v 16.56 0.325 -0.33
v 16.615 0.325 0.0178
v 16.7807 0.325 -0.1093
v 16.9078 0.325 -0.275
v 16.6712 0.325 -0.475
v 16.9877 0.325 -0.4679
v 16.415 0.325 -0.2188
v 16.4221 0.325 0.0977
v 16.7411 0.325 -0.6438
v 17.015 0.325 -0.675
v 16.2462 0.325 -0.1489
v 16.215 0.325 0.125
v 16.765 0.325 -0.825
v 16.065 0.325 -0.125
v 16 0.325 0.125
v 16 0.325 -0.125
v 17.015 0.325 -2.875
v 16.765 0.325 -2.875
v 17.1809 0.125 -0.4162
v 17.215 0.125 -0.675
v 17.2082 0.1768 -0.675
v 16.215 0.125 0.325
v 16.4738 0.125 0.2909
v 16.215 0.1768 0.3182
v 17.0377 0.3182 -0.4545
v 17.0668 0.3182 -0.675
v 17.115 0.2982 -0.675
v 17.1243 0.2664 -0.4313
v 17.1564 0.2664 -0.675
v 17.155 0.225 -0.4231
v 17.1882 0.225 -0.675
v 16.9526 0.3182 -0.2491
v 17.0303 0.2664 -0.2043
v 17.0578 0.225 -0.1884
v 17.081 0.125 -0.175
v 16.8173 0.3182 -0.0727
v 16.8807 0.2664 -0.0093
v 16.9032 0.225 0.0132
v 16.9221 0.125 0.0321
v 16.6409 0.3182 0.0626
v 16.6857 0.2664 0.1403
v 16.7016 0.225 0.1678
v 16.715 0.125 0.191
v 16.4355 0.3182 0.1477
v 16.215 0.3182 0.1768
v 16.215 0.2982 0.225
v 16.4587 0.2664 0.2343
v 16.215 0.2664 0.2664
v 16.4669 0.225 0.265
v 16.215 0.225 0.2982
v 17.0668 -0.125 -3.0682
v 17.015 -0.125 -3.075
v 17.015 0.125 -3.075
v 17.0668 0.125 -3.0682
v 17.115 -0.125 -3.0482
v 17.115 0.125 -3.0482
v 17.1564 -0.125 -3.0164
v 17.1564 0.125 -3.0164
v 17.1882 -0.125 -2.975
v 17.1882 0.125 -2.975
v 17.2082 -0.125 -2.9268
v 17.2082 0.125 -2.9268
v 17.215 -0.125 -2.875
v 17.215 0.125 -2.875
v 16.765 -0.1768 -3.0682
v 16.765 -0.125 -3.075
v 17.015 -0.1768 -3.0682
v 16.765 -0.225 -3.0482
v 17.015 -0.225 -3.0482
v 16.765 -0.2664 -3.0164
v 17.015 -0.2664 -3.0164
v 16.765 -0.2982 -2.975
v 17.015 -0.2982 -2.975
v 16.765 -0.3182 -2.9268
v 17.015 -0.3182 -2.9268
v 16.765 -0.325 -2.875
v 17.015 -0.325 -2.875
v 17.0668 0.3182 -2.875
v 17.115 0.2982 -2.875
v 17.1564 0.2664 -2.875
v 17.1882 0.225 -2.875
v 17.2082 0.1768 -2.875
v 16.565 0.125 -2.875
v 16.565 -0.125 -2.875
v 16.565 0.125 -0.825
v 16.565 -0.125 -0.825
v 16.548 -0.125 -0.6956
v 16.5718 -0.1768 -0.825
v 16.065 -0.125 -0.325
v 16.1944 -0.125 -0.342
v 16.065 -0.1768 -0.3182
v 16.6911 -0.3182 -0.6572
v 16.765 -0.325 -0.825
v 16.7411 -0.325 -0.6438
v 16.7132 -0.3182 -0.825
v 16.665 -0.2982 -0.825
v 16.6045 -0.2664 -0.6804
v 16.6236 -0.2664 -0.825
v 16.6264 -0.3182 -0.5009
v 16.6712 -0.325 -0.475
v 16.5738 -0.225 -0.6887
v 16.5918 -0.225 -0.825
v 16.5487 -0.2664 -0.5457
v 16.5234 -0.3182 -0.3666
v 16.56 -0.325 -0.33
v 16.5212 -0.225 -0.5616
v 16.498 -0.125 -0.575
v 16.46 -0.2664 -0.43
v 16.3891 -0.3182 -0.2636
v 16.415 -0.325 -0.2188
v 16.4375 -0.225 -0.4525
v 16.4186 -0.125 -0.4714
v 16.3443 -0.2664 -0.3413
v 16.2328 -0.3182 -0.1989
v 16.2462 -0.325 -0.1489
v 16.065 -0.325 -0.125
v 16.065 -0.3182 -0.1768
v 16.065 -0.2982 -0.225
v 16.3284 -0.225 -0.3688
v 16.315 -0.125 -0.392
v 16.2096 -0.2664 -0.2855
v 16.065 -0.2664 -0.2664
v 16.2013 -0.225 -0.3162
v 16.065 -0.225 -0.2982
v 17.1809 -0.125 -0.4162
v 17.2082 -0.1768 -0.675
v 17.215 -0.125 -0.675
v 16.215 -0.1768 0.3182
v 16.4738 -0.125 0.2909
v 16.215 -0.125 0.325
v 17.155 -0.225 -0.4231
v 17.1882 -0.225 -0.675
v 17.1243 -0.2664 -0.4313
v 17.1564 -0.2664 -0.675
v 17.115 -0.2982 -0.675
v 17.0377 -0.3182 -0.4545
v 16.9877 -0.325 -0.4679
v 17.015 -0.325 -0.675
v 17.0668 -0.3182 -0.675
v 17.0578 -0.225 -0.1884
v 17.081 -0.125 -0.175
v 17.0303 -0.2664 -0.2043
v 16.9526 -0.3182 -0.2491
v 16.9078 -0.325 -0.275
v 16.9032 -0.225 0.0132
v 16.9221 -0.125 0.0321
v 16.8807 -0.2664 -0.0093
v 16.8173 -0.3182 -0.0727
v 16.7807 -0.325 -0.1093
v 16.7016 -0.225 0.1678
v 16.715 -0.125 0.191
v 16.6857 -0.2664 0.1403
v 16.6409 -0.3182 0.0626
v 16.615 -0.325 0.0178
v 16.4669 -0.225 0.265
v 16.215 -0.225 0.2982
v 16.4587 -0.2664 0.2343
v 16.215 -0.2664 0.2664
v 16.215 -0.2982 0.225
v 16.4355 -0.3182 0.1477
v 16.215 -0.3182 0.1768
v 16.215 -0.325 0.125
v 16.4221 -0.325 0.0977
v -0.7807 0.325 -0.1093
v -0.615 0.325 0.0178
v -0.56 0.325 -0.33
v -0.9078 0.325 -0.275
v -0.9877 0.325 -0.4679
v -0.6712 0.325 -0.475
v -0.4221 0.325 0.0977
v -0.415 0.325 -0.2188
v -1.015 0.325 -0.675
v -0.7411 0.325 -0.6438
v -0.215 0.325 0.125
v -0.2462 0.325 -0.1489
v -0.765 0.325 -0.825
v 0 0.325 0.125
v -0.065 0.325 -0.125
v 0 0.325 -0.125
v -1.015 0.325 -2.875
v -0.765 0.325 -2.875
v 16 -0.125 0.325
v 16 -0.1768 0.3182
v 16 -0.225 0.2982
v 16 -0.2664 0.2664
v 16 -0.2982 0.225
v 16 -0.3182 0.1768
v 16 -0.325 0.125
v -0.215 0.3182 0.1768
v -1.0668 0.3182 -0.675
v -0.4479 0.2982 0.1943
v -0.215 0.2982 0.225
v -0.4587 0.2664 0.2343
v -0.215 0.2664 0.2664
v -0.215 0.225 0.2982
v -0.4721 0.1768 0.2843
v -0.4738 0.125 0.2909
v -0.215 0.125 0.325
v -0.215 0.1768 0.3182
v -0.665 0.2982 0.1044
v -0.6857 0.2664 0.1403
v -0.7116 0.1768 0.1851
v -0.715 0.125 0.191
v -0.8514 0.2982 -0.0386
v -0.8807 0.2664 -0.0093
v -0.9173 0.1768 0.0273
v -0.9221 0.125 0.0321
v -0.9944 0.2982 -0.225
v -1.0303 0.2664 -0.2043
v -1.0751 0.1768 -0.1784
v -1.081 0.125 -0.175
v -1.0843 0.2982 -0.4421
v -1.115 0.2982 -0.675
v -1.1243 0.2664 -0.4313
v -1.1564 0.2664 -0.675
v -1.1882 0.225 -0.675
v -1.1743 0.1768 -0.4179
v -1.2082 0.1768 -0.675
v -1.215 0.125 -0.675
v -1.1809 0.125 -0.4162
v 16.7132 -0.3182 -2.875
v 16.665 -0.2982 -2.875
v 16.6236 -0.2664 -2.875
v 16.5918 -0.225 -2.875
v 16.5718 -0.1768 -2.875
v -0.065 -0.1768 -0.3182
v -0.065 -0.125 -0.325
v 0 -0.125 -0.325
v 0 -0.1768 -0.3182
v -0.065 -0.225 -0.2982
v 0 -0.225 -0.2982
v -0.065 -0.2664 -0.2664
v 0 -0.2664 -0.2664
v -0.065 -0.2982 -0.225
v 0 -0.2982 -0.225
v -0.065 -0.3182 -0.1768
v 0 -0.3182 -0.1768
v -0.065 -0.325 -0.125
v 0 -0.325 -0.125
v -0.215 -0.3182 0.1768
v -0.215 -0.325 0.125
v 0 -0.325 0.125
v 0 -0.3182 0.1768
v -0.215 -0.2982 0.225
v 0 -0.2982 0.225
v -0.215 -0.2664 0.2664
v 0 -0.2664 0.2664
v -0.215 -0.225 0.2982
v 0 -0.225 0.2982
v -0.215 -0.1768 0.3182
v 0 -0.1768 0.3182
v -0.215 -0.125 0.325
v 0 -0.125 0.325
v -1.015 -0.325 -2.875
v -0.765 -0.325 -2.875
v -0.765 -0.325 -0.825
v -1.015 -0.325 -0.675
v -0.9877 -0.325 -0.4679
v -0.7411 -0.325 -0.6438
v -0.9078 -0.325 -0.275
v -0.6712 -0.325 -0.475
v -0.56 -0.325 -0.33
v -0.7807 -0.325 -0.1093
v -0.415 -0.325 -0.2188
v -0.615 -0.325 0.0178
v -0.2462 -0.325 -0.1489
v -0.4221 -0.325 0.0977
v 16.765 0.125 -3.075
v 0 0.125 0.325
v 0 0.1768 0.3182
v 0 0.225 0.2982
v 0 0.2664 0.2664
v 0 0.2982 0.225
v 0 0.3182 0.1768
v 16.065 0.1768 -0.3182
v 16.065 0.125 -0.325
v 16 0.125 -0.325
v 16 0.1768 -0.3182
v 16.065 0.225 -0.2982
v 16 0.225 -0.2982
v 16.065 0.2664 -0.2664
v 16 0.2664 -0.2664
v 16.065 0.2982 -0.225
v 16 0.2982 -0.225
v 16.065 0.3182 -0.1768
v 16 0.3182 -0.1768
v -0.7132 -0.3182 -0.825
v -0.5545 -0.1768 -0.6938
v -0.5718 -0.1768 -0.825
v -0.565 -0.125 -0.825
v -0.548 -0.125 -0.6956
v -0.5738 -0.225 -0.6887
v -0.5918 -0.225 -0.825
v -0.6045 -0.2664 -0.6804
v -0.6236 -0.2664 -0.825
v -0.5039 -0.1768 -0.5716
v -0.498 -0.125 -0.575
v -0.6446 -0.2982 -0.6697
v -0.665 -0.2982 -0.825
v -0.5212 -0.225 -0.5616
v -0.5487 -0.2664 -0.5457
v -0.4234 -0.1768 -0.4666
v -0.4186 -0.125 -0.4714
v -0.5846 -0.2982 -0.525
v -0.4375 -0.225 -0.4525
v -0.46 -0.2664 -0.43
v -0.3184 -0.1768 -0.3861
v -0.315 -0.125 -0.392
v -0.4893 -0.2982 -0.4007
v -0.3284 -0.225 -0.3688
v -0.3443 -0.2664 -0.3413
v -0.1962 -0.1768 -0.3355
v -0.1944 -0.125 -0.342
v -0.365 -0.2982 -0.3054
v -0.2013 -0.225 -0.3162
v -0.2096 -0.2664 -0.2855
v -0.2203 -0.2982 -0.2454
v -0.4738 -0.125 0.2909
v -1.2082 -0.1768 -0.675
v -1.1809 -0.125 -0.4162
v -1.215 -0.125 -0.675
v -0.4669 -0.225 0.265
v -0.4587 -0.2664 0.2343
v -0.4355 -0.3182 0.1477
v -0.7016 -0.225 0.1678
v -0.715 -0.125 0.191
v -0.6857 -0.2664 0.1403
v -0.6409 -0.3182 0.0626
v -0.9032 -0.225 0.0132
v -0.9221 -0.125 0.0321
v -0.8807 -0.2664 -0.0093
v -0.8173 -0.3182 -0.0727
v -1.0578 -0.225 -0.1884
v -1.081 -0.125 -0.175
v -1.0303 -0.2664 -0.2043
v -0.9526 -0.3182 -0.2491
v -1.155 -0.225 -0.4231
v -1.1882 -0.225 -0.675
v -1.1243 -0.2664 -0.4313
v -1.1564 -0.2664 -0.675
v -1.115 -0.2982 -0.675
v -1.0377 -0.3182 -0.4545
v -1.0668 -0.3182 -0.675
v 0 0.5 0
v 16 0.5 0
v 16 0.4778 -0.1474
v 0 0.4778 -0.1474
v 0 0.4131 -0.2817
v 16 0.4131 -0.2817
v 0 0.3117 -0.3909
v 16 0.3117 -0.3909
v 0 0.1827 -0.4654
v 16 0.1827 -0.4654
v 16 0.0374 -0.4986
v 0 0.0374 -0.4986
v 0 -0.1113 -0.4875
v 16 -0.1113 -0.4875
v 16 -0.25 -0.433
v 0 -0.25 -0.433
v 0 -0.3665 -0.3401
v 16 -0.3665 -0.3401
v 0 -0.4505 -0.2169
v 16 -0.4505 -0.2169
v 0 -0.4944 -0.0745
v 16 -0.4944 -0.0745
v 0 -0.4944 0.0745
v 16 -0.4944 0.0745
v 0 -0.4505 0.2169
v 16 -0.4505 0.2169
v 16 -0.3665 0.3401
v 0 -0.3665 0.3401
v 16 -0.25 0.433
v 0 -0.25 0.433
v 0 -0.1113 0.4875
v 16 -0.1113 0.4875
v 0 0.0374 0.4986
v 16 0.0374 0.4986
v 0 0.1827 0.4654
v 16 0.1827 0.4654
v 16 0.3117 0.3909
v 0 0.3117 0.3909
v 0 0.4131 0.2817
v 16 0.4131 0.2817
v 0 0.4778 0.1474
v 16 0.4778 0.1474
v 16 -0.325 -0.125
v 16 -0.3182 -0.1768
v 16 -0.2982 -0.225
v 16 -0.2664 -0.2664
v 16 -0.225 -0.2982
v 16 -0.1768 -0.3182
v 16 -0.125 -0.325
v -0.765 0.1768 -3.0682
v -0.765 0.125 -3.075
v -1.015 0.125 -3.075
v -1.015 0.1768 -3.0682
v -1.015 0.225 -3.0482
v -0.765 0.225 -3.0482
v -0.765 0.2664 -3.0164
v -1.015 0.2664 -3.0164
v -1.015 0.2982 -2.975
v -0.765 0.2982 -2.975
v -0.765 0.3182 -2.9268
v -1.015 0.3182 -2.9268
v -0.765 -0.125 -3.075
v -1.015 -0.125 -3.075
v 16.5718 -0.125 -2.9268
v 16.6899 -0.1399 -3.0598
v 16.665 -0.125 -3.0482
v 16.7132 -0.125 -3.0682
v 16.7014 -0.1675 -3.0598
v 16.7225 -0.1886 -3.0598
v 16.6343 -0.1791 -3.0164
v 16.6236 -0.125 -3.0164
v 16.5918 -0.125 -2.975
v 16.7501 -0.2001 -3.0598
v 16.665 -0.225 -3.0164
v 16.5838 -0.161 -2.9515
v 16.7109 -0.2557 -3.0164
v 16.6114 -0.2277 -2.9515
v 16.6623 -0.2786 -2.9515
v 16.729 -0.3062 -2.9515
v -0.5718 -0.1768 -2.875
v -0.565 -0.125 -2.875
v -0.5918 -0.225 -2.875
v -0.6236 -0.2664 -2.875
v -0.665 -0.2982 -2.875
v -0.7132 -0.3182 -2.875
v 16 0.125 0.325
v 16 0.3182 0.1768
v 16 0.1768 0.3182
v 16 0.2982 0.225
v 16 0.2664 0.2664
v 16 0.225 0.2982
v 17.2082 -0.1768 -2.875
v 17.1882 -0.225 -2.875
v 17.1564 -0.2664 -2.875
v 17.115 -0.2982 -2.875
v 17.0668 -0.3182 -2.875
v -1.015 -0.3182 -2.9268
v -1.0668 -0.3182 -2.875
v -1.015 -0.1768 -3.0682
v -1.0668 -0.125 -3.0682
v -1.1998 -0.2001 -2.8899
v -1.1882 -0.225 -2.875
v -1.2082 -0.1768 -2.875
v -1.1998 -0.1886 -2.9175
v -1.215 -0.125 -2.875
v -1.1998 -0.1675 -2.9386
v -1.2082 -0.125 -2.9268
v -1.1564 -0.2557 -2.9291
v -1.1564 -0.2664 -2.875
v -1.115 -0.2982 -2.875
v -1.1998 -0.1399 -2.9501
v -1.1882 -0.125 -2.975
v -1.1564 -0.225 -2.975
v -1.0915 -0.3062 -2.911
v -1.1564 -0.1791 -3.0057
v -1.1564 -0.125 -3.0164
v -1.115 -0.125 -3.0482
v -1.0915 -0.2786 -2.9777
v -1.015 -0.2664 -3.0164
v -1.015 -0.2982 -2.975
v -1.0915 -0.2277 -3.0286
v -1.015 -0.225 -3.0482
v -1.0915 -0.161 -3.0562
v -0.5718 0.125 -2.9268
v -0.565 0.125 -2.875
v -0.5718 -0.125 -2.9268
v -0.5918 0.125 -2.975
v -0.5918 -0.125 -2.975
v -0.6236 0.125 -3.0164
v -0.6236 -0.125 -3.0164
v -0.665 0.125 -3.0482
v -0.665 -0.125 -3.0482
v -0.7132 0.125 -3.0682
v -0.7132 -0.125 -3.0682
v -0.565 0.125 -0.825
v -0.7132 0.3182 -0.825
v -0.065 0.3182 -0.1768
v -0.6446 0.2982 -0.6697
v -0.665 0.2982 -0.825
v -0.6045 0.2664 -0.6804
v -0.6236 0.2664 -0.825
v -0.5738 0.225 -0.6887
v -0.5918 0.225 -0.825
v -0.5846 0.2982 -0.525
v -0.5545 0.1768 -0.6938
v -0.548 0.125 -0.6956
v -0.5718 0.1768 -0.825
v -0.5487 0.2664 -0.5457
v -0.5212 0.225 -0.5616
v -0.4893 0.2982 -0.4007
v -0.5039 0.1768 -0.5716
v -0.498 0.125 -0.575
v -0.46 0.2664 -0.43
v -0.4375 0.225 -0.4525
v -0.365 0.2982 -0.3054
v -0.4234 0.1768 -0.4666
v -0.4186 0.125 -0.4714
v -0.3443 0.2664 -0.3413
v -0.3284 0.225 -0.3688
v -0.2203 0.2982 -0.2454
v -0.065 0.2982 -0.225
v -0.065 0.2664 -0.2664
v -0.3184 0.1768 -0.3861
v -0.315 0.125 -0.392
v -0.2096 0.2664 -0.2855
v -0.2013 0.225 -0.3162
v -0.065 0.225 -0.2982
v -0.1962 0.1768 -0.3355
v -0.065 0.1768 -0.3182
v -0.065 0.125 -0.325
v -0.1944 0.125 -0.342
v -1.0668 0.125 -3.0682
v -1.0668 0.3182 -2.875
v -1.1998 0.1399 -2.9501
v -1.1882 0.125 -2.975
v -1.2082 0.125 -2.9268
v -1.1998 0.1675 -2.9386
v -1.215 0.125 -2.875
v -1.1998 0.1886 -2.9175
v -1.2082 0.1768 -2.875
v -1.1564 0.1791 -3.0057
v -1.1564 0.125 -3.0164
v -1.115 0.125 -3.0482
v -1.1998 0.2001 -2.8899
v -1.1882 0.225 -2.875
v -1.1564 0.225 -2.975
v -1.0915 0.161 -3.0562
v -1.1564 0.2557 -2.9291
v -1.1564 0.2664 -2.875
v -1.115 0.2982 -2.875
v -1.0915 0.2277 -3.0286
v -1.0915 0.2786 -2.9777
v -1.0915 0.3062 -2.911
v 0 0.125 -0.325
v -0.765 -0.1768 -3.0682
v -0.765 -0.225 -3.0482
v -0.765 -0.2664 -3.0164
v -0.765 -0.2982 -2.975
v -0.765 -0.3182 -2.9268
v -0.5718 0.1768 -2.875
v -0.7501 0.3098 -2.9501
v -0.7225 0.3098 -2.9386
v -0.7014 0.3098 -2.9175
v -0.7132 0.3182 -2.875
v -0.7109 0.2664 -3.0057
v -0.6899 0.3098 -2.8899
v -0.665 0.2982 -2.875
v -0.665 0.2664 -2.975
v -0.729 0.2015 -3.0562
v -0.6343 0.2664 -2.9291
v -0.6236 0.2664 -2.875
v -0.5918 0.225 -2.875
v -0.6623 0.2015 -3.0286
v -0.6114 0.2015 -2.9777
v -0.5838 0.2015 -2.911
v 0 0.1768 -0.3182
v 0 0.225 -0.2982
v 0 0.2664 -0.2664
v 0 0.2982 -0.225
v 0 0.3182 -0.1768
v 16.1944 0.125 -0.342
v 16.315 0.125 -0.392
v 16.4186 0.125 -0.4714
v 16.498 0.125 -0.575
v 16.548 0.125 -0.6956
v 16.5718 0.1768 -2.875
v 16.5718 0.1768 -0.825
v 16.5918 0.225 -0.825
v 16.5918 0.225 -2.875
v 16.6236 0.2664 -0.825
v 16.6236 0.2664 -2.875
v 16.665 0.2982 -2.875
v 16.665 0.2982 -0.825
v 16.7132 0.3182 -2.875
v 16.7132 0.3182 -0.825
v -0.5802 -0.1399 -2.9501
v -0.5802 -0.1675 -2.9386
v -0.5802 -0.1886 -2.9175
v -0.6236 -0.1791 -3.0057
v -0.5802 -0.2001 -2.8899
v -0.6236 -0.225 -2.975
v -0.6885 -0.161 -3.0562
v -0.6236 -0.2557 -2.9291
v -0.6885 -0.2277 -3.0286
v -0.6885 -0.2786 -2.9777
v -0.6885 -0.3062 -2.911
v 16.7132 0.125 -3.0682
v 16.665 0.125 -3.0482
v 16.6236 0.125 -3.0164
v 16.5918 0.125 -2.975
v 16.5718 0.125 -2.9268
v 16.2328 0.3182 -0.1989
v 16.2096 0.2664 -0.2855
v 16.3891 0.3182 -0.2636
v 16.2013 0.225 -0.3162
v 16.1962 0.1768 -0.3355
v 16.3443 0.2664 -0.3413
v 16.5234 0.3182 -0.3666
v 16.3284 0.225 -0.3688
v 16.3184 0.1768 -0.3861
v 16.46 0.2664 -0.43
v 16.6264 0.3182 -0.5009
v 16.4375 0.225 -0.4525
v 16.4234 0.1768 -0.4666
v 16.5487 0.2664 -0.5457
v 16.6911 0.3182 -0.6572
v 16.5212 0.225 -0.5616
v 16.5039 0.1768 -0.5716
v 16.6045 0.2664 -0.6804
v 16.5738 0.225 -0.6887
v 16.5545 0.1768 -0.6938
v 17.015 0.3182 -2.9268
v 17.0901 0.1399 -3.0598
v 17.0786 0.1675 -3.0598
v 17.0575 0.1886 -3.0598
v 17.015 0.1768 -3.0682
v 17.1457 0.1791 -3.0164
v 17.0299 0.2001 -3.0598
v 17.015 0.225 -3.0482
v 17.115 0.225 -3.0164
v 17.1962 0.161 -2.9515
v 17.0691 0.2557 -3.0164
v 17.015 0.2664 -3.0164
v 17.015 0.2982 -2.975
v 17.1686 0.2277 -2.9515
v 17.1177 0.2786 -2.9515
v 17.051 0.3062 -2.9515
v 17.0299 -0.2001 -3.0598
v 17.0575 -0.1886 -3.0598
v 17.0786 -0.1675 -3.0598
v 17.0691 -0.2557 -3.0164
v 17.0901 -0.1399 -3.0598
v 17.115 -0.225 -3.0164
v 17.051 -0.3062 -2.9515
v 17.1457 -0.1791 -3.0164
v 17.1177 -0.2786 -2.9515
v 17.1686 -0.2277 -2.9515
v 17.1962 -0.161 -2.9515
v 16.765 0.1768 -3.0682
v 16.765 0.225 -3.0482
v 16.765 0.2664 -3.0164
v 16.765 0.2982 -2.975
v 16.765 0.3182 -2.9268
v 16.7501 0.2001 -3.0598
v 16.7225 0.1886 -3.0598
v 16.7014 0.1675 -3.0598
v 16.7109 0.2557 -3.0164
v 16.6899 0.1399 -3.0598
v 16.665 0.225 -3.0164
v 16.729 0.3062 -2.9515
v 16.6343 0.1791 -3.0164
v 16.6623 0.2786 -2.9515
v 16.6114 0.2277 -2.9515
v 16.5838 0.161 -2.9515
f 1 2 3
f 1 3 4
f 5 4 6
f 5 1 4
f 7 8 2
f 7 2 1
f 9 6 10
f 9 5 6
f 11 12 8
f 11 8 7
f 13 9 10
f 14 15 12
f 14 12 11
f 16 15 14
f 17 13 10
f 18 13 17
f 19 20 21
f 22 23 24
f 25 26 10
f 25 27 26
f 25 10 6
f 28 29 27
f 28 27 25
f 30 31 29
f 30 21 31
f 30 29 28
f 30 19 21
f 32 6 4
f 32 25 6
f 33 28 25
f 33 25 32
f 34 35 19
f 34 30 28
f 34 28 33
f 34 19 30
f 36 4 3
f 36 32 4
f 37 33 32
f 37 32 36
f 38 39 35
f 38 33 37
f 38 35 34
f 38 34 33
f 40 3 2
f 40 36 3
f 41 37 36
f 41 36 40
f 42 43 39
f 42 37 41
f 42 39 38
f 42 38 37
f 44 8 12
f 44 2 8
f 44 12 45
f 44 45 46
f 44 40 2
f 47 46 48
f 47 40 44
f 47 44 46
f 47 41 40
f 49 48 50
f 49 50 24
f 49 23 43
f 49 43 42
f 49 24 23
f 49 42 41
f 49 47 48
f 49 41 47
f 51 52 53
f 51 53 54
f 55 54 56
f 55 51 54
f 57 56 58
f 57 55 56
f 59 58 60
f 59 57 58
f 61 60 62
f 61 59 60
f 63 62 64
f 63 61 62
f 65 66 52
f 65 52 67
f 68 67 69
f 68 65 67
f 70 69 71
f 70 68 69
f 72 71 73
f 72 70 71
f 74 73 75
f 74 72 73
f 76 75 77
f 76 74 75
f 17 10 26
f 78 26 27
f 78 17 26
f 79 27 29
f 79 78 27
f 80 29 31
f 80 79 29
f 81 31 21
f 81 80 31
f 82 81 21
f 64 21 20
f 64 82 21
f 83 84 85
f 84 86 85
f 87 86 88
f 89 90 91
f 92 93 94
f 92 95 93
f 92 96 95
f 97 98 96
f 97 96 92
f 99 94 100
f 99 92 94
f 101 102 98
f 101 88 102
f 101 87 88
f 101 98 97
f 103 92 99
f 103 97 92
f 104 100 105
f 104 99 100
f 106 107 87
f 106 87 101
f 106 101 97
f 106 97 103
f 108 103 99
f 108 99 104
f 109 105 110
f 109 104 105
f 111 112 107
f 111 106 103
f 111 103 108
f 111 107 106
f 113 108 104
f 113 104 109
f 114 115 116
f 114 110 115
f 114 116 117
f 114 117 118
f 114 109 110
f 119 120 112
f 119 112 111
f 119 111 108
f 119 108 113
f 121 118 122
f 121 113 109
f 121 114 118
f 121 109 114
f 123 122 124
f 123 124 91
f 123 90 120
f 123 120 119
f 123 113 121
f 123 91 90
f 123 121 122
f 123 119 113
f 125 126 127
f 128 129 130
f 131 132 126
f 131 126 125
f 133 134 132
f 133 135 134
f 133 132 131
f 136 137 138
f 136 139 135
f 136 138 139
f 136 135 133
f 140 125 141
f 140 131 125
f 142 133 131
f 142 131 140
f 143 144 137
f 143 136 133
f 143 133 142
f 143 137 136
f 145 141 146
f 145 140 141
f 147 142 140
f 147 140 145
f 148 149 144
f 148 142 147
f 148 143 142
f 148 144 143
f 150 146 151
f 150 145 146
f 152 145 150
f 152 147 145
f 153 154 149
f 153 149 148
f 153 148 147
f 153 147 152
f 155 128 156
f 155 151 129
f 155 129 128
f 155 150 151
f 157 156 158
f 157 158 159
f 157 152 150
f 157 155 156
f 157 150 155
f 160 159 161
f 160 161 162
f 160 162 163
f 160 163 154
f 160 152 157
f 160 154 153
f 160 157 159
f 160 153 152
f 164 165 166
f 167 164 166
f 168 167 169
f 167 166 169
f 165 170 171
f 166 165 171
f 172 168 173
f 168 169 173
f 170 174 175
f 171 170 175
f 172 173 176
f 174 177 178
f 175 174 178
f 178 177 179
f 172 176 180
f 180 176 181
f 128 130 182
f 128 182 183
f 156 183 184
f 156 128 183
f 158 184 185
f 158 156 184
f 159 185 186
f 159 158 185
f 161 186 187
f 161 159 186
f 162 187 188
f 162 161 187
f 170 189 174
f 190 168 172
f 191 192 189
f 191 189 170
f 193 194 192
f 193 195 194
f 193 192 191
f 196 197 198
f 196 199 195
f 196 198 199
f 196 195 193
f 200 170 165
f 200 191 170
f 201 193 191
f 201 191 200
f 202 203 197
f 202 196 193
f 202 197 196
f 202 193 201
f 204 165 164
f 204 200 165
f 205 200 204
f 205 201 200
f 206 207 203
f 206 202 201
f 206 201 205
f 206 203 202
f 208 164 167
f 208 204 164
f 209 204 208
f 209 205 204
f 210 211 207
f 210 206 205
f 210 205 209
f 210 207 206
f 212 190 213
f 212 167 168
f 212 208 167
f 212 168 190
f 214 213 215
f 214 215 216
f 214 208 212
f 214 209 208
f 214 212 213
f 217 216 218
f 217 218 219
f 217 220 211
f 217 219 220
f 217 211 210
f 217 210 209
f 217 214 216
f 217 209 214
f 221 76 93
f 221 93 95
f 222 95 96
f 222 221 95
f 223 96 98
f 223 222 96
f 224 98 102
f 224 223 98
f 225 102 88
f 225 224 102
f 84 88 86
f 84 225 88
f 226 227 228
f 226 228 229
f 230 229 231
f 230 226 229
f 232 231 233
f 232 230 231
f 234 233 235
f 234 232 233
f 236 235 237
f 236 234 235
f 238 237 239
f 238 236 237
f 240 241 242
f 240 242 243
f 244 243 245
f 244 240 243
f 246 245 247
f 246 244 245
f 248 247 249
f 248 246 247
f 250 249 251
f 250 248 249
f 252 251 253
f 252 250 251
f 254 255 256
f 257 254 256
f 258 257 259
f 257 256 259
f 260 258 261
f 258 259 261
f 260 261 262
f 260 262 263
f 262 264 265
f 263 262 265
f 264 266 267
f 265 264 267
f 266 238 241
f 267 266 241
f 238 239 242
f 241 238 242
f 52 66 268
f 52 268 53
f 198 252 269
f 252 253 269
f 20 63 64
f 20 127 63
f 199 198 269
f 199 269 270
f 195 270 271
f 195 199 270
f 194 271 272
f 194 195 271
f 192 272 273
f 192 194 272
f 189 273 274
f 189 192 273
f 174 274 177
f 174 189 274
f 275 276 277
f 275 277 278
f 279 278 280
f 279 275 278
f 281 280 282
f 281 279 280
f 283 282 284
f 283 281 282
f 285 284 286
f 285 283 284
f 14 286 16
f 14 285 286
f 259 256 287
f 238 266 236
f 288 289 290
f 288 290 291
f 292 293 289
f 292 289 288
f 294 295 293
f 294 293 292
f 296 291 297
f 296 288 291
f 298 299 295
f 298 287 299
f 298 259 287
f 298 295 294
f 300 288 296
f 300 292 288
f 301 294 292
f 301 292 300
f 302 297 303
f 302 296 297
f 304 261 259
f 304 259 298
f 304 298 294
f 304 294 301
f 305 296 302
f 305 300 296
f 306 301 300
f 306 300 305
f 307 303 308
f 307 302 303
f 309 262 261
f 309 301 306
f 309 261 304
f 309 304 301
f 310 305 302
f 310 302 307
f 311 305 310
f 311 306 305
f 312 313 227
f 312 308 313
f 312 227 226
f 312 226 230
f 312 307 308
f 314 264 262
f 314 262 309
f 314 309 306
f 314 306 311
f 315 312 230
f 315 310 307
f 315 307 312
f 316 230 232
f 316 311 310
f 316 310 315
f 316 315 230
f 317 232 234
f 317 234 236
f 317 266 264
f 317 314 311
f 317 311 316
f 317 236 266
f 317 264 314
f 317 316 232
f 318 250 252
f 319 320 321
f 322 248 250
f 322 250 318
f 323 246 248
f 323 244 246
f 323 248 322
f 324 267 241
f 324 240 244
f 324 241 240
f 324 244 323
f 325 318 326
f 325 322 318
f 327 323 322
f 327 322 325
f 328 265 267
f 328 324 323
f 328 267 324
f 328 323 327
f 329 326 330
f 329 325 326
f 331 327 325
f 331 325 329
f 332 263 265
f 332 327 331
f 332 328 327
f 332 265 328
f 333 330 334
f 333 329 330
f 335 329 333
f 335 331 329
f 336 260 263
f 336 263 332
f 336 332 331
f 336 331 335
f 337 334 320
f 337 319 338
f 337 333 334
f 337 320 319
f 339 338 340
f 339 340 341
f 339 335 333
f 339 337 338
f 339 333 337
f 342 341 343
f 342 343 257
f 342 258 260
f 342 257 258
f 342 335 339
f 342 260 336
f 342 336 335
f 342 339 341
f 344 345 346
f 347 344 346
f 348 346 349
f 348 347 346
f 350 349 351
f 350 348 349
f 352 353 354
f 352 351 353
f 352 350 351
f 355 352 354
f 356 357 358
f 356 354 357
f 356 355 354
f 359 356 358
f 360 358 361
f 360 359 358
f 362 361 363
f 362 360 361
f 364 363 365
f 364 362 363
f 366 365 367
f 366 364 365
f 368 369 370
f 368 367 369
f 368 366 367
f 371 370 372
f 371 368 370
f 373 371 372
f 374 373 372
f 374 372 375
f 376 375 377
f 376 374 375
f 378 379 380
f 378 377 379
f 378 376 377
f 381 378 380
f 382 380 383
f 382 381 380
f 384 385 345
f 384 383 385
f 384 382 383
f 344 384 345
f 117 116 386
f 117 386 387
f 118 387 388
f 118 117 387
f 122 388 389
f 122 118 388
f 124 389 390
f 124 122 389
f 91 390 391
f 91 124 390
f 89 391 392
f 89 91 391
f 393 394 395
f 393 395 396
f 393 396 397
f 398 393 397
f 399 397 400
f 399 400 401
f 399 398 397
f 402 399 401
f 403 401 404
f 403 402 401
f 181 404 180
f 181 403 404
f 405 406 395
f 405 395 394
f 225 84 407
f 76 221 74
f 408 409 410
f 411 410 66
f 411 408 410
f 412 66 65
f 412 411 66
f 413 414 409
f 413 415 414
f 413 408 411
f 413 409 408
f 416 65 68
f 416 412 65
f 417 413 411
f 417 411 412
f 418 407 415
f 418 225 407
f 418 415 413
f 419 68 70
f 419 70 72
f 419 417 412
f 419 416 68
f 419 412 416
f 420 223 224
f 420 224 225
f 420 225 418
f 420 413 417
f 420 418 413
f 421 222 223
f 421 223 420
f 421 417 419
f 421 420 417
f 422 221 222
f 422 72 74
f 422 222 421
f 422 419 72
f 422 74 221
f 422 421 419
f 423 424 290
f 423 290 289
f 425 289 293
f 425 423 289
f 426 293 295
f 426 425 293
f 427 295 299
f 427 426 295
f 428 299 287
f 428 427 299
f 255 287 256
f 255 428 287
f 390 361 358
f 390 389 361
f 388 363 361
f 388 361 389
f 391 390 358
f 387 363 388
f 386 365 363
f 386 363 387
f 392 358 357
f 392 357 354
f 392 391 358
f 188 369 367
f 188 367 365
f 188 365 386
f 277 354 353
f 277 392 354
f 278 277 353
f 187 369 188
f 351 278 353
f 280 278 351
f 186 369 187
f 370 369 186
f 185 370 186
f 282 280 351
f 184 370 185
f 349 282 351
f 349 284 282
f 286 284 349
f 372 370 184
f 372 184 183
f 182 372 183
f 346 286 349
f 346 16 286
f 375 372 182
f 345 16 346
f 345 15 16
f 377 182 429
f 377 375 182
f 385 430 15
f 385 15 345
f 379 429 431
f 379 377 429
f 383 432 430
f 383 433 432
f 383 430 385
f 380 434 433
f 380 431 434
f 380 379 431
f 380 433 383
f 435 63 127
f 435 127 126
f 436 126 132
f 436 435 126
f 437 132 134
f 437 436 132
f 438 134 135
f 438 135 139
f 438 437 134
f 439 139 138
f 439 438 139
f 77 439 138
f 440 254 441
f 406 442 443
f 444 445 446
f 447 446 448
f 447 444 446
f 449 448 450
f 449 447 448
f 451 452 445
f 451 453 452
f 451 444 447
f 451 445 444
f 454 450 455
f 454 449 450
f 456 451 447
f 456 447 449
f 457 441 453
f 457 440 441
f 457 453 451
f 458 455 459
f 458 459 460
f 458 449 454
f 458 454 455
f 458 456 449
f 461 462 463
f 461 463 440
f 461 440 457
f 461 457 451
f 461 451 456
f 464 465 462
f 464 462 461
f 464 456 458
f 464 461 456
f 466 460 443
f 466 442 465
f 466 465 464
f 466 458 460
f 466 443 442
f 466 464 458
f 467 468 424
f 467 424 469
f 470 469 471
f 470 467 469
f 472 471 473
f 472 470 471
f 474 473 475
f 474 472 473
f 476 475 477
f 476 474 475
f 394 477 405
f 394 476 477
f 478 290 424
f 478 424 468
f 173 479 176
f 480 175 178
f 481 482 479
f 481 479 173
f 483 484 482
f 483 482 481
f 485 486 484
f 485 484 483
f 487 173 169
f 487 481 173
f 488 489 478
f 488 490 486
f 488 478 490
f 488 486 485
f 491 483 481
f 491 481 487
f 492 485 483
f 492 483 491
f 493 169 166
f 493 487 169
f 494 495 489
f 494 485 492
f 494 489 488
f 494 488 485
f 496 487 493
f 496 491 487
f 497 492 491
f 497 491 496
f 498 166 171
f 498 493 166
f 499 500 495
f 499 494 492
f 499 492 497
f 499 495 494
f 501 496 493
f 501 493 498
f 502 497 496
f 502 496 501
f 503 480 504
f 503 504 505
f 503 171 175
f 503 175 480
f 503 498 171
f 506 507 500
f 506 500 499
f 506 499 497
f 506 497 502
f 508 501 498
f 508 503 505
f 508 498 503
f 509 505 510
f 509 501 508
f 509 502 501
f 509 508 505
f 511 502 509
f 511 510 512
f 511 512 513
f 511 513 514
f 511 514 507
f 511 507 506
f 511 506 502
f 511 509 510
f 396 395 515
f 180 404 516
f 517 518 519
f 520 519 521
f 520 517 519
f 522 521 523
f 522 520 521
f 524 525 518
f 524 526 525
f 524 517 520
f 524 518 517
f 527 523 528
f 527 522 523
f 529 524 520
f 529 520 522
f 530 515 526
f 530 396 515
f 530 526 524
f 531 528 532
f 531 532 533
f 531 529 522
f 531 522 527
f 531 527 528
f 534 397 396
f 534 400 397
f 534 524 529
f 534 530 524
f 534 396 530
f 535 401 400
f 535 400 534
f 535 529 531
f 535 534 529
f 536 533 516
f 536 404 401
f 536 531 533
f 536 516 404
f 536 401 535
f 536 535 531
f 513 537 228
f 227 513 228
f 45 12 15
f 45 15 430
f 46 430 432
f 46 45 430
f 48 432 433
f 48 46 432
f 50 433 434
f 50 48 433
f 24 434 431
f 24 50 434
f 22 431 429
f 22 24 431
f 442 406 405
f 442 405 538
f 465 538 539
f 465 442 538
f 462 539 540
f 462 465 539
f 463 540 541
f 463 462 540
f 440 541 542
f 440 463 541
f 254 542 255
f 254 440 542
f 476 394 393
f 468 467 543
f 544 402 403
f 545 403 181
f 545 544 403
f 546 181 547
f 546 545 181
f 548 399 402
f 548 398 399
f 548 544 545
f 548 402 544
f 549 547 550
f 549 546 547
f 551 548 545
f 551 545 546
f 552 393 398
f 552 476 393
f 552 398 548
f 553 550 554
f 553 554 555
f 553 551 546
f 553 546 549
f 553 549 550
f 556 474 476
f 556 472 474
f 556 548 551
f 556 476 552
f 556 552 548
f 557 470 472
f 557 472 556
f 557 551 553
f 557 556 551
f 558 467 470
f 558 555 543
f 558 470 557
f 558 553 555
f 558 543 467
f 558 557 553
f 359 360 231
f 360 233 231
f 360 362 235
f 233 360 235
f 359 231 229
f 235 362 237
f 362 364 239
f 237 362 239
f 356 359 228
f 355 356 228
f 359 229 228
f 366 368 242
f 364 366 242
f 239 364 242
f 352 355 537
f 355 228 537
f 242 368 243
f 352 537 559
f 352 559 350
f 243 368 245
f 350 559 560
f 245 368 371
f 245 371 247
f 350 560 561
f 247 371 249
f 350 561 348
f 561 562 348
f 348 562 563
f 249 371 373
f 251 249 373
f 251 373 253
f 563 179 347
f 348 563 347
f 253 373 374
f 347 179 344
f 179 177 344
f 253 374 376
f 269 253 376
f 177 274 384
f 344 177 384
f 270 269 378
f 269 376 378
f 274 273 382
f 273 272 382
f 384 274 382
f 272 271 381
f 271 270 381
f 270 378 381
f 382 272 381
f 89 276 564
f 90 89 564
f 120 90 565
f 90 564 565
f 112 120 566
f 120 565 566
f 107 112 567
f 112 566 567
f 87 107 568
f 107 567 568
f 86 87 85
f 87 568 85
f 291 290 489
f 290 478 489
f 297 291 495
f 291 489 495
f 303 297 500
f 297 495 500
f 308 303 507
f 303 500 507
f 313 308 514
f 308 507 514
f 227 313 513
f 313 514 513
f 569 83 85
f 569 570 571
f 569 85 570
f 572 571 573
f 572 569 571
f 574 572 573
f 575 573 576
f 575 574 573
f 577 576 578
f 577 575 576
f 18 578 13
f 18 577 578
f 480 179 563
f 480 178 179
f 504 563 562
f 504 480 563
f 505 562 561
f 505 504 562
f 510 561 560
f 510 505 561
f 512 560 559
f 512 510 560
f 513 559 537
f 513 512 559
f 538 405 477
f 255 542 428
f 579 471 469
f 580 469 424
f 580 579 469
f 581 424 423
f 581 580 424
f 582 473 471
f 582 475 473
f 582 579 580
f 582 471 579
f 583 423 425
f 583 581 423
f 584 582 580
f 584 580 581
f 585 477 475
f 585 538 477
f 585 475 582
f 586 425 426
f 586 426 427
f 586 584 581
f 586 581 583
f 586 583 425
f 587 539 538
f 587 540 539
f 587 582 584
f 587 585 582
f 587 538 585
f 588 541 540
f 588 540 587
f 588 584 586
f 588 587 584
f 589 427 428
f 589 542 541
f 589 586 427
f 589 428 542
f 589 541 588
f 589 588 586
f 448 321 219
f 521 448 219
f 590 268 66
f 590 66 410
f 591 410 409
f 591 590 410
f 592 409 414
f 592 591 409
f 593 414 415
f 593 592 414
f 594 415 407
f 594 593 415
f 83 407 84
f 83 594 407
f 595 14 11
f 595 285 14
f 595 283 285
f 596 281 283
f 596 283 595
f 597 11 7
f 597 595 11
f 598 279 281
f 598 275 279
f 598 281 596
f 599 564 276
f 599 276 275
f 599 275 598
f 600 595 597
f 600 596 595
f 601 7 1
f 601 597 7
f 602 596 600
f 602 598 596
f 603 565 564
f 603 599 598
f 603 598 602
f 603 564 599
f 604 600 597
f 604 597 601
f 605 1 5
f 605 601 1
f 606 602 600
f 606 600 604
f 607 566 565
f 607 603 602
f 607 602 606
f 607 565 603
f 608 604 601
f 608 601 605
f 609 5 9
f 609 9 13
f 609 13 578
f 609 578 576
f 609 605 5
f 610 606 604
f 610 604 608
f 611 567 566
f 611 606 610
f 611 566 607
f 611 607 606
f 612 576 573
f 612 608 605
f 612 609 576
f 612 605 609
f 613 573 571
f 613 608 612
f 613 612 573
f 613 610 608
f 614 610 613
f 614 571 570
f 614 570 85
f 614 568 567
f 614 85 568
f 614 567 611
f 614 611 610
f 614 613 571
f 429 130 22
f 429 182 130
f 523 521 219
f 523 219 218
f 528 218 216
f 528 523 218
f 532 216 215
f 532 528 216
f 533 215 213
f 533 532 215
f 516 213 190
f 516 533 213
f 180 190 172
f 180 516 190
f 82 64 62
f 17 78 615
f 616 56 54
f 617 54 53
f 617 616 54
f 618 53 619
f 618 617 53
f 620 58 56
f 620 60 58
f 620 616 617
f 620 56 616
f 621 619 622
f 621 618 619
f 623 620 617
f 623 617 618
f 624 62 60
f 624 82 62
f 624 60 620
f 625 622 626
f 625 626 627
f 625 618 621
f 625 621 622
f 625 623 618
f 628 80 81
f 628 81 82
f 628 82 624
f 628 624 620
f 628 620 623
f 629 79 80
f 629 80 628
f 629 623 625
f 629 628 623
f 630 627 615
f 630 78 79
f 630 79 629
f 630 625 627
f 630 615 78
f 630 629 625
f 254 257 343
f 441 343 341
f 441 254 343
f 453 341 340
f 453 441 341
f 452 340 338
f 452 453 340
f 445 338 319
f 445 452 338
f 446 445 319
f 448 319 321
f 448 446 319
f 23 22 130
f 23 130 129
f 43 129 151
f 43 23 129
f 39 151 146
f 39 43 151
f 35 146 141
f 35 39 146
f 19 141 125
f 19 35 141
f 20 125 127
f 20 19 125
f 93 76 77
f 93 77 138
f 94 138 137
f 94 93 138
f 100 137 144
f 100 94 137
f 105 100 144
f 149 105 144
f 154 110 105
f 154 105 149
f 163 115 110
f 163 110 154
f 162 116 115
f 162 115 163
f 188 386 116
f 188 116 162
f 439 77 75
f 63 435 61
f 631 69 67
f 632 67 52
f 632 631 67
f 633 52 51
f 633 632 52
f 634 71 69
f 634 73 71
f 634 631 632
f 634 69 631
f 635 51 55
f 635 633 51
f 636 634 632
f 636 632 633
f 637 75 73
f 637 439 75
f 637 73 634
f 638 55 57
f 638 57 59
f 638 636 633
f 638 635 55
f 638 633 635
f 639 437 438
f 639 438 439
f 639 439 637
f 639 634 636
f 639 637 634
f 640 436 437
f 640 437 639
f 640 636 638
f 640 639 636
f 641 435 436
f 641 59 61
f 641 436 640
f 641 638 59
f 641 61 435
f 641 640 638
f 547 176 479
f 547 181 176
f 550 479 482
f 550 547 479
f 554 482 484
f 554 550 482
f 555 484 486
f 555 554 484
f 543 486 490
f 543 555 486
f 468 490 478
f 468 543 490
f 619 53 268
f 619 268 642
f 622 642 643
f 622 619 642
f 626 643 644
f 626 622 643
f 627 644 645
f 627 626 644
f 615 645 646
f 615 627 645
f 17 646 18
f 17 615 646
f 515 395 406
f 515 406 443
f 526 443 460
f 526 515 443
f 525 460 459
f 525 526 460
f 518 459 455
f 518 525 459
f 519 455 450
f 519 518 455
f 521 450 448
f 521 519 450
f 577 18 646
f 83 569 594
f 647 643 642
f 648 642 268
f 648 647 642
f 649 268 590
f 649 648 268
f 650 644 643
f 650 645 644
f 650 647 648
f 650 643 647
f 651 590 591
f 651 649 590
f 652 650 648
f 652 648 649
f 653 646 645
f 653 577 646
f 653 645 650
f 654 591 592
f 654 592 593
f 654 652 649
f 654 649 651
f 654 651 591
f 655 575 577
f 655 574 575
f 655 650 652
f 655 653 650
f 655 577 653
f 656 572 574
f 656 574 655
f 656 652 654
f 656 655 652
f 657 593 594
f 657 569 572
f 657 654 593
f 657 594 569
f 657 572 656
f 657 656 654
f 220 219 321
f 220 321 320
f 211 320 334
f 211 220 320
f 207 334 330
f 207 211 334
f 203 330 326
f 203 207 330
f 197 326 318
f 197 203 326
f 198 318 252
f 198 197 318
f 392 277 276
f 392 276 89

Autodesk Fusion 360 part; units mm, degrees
sketch "Sketch1" plane through (0, 0, 0) normal (1, 0, 0) x (0, 1, 0)
  circle A0 centre (0, 0) radius 0.5
  line L0 (0.325, -0.325) -> (-0.325, -0.325)
  line L1 (-0.325, -0.325) -> (-0.325, 0.325)
  line L2 (-0.325, 0.325) -> (0.325, 0.325)
  line L3 (0.325, 0.325) -> (0.325, -0.325)
  line L4 (0.325, -0.325) -> (-0.325, 0.325) construction
  line L5 (-0.325, -0.325) -> (0.325, 0.325) construction
  dimension "d1" = 1
  dimension "d2" = 0.65
  dimension "d3" = 0.65
extrude "Extrude1" add sketch "Sketch1" along normal blind 16 contours A0 | L0 L1 L2 L3
sketch "Sketch2" plane through (16, 0, 0) normal (1, 0, 0) x (0, 1, 0)
  circle A0 centre (0, 0) radius 0.5
  line L0 (0.325, -0.325) -> (-0.325, -0.325)
  line L1 (-0.325, -0.325) -> (-0.325, 0.325)
  line L2 (-0.325, 0.325) -> (0.325, 0.325)
  line L3 (0.325, 0.325) -> (0.325, -0.325)
  line L4 (0.325, -0.325) -> (-0.325, 0.325) construction
  line L5 (-0.325, -0.325) -> (0.325, 0.325) construction
  dimension "d8" = 0.65
  dimension "d9" = 0.65
extrude "Extrude2" add sketch "Sketch2" along normal blind 1.215 contours L0 L1 L2 L3
extrude "Extrude3" add sketch "Sketch1" against normal blind 1.215 contours L0 L1 L2 L3
sketch "Sketch3" plane through (0, 0, -0.325) normal (0, 0, -1) x (1, 0, 0)
  line L0 (16, 0.325) -> (16, -0.325)
  line L1 (16, -0.325) -> (17.215, -0.325)
  line L2 (17.215, -0.325) -> (17.215, 0.325)
  line L3 (17.215, 0.325) -> (16, 0.325)
  line L4 (17.215, 0.325) -> (16.565, 0.325)
  line L5 (16.565, 0.325) -> (16.565, -0.325)
  line L6 (16.565, -0.325) -> (17.215, -0.325)
  line L7 (17.215, -0.325) -> (17.215, 0.325)
  line L8 (17.215, 0.325) -> (16.565, -0.325) construction
  line L9 (16.565, 0.325) -> (17.215, -0.325) construction
  point P0 (16.89, 0)
  dimension "d14" = 0.65
  dimension "d15" = 0.65
sketch "Sketch4" plane through (0, 0, -0.325) normal (0, 0, -1) x (1, 0, 0)
  line L0 (0, -0.325) -> (0, 0.325)
  line L1 (0, 0.325) -> (-1.215, 0.325)
  line L2 (-1.215, 0.325) -> (-1.215, -0.325)
  line L3 (-1.215, -0.325) -> (0, -0.325)
  line L4 (-0.565, -0.325) -> (-1.215, -0.325)
  line L5 (-1.215, -0.325) -> (-1.215, 0.325)
  line L6 (-1.215, 0.325) -> (-0.565, 0.325)
  line L7 (-0.565, 0.325) -> (-0.565, -0.325)
  line L8 (-0.565, -0.325) -> (-1.215, 0.325) construction
  line L9 (-1.215, -0.325) -> (-0.565, 0.325) construction
  point P0 (-0.89, 0)
  dimension "d17" = 0.65
  dimension "d18" = 0.65
extrude "Extrude4" add sketch "Sketch4" sketch "Sketch3" along normal blind 2.75 contours L1 L2 L3 L4 L5 L6 L7 of sketch 2 contours L1 L2 L3 L4 L5 L6 L7
fillet "Fillet1" radius 0.5 2 edges at (-0.565, 0, -0.325) (16.565, 0, -0.325)
fillet "Fillet2" radius 1 2 edges at (-1.215, 0, 0.325) (17.215, 0, 0.325)
fillet "Fillet3" radius 0.2 28 edges at (-0.89, -0.325, -3.075) (-0.565, 0, -3.075) (-0.89, 0.325, -3.075) (-1.215, 0, -3.075) (-0.4186, -0.325, -0.4714) (-0.565, -0.325, -1.95) (-0.1075, -0.325, 0.325) (-0.9221, -0.325, 0.0321) (-1.215, -0.325, -1.875) (-0.1075, 0.325, 0.325) (-0.9221, 0.325, 0.0321) (-1.215, 0.325, -1.875) (-0.4186, 0.325, -0.4714) (-0.565, 0.325, -1.95) (16.1075, -0.325, 0.325) (16.9221, -0.325, 0.0321) (17.215, -0.325, -1.875) (16.565, -0.325, -1.95) (16.4186, -0.325, -0.4714) (17.215, 0.325, -1.875) (16.9221, 0.325, 0.0321) (16.1075, 0.325, 0.325) (16.4186, 0.325, -0.4714) (16.565, 0.325, -1.95) (16.89, 0.325, -3.075) (17.215, 0, -3.075) (16.89, -0.325, -3.075) (16.565, 0, -3.075)
equation "d1 = width"
equation "d2 = d3"
equation "d3 = d1 * 0.65"
equation "width = 1 mm"
equation "baseLenght = 16 mm"
equation "d6 = baseLenght"
equation "d8 = width * 0.65"
equation "d9 = d8"
equation "d10 = ( ( 2.54 * ceil(( baseLenght + 1.3 * width ) / 2.54 mm) ) * 1 mm + 0.65 * width - baseLenght ) / 2"
equation "d12 = -( ( 2.54 * ceil(( baseLenght + 1.3 * width ) / 2.54 mm) ) * 1 mm + 0.65 * width - baseLenght ) / 2"
equation "d14 = width * 0.65"
equation "d15 = d14"
equation "d17 = width * 0.65"
equation "d18 = d17"
equation "d26 = 0.2 * width"
